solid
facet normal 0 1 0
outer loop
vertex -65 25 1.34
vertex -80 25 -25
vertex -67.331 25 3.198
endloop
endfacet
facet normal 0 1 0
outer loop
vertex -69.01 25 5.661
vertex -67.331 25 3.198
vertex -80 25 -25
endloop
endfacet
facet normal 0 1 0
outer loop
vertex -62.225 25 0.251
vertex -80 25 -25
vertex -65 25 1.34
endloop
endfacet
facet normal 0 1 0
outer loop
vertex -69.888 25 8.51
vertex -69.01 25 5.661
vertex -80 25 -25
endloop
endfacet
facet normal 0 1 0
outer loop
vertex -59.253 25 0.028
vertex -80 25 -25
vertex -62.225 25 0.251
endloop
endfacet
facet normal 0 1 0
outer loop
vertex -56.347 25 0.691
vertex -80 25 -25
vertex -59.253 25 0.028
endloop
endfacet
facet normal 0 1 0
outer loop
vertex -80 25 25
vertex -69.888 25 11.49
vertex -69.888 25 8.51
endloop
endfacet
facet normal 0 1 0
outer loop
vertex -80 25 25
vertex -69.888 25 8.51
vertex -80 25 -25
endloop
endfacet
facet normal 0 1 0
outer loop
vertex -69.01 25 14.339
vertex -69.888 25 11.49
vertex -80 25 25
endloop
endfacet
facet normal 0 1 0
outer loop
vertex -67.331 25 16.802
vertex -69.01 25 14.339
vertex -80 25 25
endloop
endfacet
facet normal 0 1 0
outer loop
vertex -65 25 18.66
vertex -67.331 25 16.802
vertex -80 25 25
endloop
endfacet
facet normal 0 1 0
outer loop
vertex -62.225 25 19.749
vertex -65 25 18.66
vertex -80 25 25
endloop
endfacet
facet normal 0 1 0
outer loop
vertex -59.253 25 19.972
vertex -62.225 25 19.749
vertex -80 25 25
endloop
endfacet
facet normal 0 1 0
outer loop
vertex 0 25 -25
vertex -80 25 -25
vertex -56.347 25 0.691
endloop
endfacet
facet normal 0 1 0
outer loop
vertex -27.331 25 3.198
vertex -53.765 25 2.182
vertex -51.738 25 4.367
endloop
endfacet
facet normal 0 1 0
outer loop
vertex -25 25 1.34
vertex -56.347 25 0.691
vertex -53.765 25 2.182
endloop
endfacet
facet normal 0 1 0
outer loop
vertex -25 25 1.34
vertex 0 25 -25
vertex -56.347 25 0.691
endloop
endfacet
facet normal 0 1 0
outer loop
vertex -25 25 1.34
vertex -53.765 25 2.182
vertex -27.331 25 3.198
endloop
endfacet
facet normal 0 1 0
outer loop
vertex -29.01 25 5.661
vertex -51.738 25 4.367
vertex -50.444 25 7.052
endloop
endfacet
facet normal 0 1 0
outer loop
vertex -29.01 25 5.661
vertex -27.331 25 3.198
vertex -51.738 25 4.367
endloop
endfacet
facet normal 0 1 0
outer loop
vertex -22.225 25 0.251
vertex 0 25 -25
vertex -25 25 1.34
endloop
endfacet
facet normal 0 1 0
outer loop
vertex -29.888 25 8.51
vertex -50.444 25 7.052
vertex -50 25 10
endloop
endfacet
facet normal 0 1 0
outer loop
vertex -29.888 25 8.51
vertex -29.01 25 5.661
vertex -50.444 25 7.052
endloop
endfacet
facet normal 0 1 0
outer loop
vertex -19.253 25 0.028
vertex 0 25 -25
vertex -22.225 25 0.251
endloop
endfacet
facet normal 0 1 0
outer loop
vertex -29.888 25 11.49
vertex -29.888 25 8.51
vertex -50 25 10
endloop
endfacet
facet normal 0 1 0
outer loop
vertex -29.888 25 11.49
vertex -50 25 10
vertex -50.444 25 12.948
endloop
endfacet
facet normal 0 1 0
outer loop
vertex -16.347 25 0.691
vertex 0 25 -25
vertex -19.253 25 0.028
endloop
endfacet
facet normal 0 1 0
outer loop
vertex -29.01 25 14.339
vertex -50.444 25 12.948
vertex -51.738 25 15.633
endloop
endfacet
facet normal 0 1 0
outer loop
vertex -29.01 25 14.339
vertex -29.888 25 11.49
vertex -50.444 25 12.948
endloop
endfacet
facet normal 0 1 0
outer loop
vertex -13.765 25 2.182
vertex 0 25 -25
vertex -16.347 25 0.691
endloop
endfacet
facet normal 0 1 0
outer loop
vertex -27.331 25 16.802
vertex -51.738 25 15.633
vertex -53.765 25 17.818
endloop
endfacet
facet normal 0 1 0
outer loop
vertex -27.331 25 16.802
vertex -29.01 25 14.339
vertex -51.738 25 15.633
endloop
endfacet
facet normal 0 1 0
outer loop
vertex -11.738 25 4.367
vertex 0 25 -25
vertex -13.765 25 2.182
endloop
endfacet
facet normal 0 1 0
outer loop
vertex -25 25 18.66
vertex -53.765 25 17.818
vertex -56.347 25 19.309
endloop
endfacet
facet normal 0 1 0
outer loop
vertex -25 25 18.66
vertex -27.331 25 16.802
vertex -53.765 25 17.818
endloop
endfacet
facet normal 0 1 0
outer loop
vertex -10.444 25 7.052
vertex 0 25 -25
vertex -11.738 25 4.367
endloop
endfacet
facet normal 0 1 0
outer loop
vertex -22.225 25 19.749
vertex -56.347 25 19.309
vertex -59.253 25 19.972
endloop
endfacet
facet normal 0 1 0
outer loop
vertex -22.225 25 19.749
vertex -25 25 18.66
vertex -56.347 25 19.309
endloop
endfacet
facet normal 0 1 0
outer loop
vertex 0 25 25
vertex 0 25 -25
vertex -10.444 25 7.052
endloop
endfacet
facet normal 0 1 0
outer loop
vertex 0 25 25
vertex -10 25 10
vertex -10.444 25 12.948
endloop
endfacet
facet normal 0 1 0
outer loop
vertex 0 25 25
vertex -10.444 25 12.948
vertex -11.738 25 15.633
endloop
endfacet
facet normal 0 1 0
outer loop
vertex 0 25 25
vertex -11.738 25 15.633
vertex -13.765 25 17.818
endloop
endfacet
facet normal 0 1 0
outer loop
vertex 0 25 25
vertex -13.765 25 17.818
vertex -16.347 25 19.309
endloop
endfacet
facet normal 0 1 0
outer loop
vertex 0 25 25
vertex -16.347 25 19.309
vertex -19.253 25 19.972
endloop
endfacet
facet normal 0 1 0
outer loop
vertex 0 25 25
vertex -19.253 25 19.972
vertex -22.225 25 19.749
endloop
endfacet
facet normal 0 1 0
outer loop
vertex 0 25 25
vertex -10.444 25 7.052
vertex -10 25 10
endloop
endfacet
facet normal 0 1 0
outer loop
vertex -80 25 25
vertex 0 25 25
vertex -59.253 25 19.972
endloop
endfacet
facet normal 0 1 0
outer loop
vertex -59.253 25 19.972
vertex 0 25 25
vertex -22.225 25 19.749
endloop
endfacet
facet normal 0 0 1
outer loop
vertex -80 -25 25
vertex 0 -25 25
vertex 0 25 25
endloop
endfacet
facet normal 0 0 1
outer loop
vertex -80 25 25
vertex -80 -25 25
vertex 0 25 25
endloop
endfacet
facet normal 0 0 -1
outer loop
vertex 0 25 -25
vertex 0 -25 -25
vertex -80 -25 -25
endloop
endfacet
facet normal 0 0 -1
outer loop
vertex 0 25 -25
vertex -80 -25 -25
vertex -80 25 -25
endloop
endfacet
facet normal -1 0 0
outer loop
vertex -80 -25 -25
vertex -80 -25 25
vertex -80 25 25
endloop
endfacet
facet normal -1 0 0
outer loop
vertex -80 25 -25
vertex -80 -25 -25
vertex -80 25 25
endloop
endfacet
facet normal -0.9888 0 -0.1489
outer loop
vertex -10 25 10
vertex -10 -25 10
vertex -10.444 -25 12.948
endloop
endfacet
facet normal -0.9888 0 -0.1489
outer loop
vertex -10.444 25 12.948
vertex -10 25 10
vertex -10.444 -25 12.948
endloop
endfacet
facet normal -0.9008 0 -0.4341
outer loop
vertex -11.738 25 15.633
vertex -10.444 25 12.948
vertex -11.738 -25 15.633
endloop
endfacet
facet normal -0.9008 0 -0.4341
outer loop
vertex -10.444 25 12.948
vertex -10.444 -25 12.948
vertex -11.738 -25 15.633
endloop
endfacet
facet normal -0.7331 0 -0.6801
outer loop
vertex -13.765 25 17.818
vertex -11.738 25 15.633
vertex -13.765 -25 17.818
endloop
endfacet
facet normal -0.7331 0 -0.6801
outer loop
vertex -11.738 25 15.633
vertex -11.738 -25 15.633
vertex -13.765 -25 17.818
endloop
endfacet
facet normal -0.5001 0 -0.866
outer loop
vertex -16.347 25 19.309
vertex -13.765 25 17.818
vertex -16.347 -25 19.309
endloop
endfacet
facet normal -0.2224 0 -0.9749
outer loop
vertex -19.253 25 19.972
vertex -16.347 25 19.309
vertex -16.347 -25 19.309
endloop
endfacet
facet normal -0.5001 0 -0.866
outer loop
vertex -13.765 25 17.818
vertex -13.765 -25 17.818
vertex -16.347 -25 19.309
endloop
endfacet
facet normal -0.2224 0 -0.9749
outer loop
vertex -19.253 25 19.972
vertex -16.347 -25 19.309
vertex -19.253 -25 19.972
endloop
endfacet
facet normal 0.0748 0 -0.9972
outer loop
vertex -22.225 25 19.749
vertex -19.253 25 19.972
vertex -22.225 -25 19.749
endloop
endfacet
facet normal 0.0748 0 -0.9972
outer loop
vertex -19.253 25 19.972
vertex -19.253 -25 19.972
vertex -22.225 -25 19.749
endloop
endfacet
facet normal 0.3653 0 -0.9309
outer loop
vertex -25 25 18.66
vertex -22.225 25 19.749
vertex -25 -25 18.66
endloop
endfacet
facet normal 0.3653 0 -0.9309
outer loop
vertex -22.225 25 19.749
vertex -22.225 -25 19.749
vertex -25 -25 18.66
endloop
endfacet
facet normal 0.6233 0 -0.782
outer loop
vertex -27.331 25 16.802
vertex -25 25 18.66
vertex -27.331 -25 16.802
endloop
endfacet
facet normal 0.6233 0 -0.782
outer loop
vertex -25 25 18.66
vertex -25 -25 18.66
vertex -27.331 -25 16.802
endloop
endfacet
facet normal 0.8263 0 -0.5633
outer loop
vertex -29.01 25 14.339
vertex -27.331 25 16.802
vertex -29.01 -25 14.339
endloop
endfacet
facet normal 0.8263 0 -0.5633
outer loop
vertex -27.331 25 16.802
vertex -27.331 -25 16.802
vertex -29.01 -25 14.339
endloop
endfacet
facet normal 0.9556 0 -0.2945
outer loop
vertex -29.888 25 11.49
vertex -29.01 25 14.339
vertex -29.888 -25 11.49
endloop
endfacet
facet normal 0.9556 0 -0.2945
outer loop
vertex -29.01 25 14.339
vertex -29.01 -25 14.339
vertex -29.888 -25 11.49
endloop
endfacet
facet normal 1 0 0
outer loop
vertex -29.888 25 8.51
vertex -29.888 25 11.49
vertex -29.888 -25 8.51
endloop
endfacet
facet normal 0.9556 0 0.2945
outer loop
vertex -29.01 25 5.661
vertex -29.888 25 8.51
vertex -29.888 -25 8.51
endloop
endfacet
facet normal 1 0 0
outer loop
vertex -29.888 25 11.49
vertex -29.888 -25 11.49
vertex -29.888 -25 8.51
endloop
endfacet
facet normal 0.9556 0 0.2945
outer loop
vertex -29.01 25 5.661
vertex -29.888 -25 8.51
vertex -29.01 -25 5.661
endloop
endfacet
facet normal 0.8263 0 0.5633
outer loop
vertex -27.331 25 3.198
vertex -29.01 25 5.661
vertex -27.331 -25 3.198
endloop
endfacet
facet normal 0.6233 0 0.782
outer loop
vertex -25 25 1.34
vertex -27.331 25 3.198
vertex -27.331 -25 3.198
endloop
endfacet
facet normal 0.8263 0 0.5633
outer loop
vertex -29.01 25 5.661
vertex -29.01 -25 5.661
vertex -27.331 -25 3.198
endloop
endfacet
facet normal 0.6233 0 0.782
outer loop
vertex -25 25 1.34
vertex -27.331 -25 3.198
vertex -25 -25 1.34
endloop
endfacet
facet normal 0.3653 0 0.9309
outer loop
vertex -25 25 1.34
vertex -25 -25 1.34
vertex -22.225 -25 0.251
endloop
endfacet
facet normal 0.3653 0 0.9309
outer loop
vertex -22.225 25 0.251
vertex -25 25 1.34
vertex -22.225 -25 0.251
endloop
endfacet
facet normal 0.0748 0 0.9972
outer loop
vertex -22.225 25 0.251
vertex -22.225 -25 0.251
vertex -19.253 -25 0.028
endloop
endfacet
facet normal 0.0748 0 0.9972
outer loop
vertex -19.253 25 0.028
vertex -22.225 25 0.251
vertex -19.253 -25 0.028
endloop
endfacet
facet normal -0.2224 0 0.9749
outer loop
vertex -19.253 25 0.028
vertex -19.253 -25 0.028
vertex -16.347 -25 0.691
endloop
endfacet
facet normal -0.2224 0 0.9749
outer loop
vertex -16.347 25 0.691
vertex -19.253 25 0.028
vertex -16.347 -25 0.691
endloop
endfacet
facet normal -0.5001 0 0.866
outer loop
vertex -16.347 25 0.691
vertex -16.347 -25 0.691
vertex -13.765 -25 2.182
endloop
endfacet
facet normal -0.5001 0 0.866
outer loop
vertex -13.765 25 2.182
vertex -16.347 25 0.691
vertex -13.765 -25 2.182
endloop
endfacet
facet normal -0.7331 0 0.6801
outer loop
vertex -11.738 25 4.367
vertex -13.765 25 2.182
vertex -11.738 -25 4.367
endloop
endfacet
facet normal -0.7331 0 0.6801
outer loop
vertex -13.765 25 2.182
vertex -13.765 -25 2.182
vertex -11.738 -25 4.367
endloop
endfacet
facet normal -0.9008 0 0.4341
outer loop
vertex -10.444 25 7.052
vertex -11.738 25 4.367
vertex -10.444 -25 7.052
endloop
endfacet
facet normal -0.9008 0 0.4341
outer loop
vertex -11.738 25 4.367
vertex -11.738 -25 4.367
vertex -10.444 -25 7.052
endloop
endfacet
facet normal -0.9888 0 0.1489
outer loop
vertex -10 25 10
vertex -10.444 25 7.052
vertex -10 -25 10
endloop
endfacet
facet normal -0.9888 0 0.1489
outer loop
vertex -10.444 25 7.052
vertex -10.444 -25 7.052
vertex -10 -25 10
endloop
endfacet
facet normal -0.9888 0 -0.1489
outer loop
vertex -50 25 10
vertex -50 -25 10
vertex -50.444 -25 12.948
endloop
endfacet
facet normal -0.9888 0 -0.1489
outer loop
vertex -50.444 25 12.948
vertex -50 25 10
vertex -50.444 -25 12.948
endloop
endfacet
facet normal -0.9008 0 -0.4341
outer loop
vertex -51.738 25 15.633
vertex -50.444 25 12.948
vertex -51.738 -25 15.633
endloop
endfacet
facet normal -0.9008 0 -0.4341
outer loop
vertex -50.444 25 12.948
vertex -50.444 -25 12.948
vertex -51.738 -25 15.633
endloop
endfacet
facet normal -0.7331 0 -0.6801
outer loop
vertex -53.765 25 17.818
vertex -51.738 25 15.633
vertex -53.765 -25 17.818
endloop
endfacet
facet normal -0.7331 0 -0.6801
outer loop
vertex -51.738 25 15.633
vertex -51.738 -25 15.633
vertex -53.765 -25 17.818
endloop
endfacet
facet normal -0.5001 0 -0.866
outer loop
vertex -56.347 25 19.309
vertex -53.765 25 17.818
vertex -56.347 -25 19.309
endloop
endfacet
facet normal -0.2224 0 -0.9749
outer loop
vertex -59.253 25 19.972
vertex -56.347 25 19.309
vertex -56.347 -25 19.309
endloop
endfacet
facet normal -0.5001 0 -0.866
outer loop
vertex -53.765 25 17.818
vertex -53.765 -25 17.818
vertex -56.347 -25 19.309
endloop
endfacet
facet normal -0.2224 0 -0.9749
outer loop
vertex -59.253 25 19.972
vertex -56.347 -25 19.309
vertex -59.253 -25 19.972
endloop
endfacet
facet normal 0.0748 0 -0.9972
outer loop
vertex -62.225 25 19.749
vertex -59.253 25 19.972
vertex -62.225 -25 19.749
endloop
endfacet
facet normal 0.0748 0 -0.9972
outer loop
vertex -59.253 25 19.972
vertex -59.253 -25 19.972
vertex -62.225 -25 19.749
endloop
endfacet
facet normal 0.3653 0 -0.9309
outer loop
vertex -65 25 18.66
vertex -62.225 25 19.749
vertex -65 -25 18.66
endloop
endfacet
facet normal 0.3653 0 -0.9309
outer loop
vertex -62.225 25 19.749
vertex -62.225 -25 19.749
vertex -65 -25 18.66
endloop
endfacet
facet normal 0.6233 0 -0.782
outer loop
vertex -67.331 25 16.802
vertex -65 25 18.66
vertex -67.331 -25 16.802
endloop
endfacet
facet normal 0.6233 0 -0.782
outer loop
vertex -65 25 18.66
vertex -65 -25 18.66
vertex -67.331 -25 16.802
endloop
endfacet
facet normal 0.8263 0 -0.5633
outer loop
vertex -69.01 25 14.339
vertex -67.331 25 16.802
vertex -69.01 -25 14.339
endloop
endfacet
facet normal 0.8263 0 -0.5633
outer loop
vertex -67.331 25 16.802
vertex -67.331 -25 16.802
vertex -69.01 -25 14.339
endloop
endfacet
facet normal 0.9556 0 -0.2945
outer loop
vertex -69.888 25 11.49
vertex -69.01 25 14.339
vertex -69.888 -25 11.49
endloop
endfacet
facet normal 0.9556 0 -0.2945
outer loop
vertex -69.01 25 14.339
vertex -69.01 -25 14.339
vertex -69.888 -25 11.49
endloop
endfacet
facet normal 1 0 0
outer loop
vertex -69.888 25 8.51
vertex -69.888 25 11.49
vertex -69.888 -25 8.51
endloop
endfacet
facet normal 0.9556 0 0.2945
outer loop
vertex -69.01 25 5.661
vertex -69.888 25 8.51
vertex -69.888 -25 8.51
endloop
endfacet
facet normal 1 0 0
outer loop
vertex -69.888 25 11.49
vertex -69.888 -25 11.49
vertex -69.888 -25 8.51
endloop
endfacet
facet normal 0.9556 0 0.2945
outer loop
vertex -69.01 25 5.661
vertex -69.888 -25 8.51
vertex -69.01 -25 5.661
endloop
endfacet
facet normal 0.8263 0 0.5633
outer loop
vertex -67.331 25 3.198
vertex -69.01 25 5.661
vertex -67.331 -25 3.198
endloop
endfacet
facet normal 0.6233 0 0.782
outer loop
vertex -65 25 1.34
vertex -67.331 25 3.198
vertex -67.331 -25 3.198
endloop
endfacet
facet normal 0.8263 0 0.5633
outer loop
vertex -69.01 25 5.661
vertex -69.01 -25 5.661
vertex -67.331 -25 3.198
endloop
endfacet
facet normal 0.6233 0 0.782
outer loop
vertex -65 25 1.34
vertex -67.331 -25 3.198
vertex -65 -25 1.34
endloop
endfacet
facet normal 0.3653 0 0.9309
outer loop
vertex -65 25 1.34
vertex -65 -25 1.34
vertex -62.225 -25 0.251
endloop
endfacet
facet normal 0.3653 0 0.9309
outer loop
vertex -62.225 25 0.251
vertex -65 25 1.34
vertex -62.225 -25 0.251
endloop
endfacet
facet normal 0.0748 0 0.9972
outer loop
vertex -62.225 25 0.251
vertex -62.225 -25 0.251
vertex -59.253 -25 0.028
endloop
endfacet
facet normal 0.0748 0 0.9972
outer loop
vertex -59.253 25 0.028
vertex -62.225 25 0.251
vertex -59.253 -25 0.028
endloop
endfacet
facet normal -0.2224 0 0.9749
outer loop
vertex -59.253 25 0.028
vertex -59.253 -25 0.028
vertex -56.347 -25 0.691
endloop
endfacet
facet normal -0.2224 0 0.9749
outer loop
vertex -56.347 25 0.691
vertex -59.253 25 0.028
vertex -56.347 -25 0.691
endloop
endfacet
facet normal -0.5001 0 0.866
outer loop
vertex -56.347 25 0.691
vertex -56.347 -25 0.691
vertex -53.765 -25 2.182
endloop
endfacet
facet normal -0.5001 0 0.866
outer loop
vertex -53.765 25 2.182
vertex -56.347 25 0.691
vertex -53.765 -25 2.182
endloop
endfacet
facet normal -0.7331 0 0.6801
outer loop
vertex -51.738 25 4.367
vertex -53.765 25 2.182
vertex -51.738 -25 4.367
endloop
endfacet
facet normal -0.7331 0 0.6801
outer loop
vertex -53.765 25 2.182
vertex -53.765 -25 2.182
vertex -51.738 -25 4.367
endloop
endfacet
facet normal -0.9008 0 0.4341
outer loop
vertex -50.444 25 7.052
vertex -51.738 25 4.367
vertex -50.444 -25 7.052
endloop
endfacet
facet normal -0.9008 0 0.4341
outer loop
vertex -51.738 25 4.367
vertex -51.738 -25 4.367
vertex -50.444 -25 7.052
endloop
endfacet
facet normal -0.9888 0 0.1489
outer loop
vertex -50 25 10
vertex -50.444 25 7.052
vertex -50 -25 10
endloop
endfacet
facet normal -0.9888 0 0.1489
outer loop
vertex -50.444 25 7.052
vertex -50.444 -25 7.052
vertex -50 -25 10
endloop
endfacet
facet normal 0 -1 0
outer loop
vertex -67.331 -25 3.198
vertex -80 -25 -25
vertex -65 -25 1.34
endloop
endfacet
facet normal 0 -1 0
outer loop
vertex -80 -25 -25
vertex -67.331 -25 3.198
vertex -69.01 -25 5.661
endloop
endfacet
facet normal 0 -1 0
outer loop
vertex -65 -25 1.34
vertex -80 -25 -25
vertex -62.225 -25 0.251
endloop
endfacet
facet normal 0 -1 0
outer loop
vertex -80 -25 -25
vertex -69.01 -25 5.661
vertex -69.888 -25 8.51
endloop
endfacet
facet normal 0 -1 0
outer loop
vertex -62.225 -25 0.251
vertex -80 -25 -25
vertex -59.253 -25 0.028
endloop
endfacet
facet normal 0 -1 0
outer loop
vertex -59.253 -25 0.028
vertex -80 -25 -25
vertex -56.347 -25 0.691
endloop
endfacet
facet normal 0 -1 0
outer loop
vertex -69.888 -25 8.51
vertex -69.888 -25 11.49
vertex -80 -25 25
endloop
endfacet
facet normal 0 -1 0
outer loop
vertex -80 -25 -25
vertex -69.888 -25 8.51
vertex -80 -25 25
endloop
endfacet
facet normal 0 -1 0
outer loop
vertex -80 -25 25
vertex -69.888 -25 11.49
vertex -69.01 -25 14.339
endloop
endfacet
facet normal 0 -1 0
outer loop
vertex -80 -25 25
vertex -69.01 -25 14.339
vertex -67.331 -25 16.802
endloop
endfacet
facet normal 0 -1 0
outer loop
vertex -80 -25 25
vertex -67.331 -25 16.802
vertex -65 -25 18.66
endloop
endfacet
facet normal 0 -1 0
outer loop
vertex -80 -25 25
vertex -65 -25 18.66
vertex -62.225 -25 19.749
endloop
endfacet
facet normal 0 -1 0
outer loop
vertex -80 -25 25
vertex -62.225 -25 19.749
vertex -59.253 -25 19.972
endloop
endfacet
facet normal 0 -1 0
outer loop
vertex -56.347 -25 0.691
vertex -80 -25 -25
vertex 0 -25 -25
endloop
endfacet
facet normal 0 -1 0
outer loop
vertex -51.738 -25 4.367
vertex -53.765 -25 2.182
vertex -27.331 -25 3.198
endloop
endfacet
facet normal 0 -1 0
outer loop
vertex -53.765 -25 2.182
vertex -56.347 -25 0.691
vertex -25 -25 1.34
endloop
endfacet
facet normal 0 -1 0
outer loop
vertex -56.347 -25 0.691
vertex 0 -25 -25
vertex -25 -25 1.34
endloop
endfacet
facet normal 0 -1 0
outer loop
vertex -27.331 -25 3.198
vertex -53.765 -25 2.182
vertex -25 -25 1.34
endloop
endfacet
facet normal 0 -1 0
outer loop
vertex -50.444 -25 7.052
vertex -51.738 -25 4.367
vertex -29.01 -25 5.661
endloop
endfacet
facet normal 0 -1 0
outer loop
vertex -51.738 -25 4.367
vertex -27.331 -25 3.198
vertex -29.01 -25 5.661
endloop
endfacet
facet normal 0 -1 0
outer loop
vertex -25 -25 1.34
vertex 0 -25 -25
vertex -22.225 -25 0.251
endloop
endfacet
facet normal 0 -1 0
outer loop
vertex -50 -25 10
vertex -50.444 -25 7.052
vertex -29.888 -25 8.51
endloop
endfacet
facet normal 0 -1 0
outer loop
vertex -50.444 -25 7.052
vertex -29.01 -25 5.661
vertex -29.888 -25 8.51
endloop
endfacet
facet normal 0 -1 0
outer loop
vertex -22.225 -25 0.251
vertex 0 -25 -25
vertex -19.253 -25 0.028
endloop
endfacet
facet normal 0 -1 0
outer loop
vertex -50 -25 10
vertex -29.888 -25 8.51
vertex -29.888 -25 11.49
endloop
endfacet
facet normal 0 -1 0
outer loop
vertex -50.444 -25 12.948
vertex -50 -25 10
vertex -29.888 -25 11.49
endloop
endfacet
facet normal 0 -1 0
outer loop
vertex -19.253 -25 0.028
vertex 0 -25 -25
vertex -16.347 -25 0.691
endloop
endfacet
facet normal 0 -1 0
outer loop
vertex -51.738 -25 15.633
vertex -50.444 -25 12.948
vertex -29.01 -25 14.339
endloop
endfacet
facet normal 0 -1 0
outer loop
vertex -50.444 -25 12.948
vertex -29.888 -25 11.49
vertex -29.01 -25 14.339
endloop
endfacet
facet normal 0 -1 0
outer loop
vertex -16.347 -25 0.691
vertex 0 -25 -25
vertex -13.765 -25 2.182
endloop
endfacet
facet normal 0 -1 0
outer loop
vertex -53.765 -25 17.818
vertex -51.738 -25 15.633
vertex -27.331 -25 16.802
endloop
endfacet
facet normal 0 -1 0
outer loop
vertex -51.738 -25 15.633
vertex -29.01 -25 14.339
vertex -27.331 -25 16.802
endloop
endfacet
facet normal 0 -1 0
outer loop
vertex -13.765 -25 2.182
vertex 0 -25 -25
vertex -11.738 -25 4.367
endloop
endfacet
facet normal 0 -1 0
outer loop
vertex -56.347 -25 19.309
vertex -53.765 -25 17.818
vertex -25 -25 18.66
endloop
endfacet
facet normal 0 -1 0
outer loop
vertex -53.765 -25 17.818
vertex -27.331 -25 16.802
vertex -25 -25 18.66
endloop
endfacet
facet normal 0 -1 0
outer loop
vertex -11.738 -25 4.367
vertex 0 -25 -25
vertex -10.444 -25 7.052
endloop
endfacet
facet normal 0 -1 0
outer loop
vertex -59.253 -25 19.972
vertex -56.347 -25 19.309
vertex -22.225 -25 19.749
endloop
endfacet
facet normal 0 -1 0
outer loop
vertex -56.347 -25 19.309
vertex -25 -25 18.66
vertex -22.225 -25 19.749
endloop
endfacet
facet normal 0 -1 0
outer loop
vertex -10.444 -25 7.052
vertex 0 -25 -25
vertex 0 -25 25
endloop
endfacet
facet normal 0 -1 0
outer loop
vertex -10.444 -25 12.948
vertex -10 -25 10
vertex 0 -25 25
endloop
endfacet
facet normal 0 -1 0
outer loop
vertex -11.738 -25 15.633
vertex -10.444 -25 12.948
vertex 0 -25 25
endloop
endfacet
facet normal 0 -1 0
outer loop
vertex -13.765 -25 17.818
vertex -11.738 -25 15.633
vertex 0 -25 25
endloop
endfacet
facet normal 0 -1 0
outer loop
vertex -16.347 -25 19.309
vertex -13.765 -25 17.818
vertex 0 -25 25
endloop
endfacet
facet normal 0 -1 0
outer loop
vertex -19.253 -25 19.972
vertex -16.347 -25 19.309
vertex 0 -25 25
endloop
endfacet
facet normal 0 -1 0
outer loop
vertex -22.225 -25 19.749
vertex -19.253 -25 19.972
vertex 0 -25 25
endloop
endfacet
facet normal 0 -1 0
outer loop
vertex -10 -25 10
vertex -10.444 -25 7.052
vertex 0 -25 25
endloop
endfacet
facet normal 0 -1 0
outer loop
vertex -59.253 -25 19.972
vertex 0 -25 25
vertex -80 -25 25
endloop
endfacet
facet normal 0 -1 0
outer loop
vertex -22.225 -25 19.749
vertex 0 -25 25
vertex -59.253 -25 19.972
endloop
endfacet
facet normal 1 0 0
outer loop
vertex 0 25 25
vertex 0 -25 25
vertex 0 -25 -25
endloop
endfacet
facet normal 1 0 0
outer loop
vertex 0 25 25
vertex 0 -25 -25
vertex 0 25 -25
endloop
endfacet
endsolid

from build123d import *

# Parameters (mm, degrees)
F0_W     = 50
F0_H     = 50
F1_DEPTH = 80
F2_R     = 10
F3_DEPTH = 50


with BuildPart() as f1:
    # F0 (on Right) → F1 (new body)
    with BuildSketch(Plane.YZ):
        Rectangle(F0_W, F0_H)
    extrude(amount=-F1_DEPTH)

    # F2 (on face) → F3 (cut, through all)
    with BuildSketch(Plane.XZ.offset(25)):
        with Locations((-60, 10)):
            Circle(F2_R)
        with Locations((-20, 10)):
            Circle(F2_R)
    extrude(amount=-F3_DEPTH, mode=Mode.SUBTRACT)


solid = f1.part
